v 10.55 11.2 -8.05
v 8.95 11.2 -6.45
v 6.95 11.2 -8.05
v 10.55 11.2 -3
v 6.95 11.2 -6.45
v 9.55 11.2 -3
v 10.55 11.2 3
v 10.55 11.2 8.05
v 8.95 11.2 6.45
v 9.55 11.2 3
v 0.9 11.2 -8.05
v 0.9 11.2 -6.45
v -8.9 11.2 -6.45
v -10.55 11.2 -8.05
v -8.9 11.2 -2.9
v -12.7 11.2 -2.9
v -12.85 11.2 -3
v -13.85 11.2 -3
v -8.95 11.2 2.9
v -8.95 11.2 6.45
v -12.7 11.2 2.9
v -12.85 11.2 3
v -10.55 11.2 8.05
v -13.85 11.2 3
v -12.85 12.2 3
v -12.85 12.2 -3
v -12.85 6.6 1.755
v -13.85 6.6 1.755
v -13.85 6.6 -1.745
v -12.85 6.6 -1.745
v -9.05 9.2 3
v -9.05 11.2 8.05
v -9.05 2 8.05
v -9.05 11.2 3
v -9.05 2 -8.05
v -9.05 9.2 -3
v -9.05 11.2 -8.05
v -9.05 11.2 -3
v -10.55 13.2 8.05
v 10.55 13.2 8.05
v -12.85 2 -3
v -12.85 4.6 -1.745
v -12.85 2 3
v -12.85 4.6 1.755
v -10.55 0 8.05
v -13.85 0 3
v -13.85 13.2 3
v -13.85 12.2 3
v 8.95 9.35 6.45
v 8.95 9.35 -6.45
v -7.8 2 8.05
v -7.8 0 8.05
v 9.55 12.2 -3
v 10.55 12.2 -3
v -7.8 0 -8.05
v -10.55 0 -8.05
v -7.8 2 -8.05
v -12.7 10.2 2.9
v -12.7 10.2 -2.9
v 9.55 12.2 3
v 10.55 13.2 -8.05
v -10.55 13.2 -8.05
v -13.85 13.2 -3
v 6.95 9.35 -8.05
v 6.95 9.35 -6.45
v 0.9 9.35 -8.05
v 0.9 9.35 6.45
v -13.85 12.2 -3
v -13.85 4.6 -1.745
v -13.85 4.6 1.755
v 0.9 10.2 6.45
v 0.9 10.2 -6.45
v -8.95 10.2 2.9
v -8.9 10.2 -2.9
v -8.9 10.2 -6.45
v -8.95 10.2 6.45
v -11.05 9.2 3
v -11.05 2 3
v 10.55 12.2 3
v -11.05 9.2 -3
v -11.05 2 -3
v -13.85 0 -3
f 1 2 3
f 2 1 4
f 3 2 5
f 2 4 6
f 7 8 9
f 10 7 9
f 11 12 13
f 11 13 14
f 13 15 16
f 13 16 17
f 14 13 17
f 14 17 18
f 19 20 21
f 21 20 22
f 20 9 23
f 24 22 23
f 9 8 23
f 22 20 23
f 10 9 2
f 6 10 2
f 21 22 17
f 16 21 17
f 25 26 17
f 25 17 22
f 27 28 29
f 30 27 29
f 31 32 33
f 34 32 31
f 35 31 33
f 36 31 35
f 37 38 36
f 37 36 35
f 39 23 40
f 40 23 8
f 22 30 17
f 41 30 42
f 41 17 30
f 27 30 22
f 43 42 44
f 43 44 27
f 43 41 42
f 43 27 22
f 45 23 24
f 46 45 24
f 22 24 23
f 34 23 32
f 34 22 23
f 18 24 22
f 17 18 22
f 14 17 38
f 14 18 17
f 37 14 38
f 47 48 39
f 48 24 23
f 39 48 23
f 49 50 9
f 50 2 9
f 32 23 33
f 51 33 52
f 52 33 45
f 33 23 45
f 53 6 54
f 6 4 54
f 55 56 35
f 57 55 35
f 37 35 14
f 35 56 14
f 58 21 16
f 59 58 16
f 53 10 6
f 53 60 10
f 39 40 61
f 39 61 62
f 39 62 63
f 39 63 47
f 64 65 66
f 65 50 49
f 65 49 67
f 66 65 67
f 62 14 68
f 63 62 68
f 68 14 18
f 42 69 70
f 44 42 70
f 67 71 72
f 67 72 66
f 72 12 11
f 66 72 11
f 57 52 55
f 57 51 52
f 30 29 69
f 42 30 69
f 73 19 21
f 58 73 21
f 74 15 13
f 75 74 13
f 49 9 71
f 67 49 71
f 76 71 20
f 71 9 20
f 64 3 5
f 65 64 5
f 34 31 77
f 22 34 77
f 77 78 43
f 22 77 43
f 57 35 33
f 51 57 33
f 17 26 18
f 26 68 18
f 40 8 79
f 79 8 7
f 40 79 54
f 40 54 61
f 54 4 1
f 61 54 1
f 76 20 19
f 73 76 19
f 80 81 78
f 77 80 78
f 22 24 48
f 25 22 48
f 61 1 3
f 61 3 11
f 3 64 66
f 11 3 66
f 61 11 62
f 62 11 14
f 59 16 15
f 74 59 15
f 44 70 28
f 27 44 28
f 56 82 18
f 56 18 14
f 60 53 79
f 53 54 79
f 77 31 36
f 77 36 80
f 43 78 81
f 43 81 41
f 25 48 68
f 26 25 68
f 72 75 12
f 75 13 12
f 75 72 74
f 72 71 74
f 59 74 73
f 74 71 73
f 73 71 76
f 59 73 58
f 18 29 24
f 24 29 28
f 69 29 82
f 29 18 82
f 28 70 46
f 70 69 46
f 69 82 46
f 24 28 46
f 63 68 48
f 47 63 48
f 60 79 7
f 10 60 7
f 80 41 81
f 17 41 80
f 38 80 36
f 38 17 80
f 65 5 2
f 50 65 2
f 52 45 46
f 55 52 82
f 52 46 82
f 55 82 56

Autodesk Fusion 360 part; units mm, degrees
sketch "Sketch1" plane through (0, 0, 0) normal (0, 1, 0) x (1, 0, 0)
  line L0 (10.55, -8.05) -> (-10.55, -8.05)
  line L1 (-10.55, -8.05) -> (-10.55, 8.05)
  line L2 (-10.55, 8.05) -> (10.55, 8.05)
  line L3 (10.55, 8.05) -> (10.55, -8.05)
  line L4 (10.55, -8.05) -> (-10.55, 8.05) construction
  line L5 (-10.55, -8.05) -> (10.55, 8.05) construction
  dimension "d1" = 21.1
  dimension "d2" = 16.1
extrude "Extrude1" add sketch "Sketch1" along normal blind 3.5 makes body 1
sketch "Sketch2" plane through (0, 3.5, 0) normal (0, 1, 0) x (-1, 0, 0)
  line L0 (-10.55, -8.05) -> (10.55, -8.05)
  line L1 (10.55, -8.05) -> (10.55, 8.05)
  line L2 (10.55, 8.05) -> (-10.55, 8.05)
  line L3 (-10.55, 8.05) -> (-10.55, -8.05)
  line L4 (-9.05, 6.55) -> (9.05, 6.55)
  line L5 (9.05, 6.55) -> (9.05, -6.55)
  line L6 (9.05, -6.55) -> (-9.05, -6.55)
  line L7 (-9.05, -6.55) -> (-9.05, 6.55)
  line L8 (-9.05, 6.55) -> (9.05, -6.55) construction
  line L9 (9.05, 6.55) -> (-9.05, -6.55) construction
  dimension "d5" = 18.1
  dimension "d6" = 13.1
extrude "Extrude2" cut sketch "Sketch2" against normal blind 1.5 contours L4 L5 L6 L7 bodies 1
extrude "Extrude3" add 1 faces at (-3.0167, 3.5, -7.55) along direction (0, 1, 0) blind 5.7 on bodies 1 bodies 1
sketch "Sketch3" plane through (0, 9.2, 0) normal (0, 1, 0) x (-1, 0, 0)
  line L0 (9.05, 6.55) -> (9.05, -6.55)
  line L1 (9.05, -6.55) -> (-9.05, -6.55)
  line L2 (-9.05, -6.55) -> (-9.05, 6.55)
  line L3 (-9.05, 6.55) -> (9.05, 6.55)
  line L4 (-10.55, -8.05) -> (10.55, -8.05)
  line L5 (10.55, -8.05) -> (10.55, 8.05)
  line L6 (10.55, 8.05) -> (-10.55, 8.05)
  line L7 (-10.55, 8.05) -> (-10.55, -8.05)
  line L8 (-9.05, -6.55) -> (-7.1, -6.55)
  line L9 (-7.1, -6.55) -> (-7.1, -8.05)
  line L10 (-7.1, -8.05) -> (-9.05, -8.05)
  line L11 (-9.05, -8.05) -> (-9.05, -6.55)
  line L12 (-7.1, -6.55) -> (-0.8, -6.55)
  line L13 (-0.8, -6.55) -> (-0.8, -8.05)
  line L14 (-0.8, -8.05) -> (-7.1, -8.05)
  line L15 (-7.1, -8.05) -> (-7.1, -6.55)
  dimension "d11" = 1.95
  dimension "d12" = 6.3
extrude "Extrude4" cut sketch "Sketch3" against normal blind 5.7 contours L1 L4 L9 L12 L13 L14 L15 bodies 1
sketch "Sketch4" plane through (0, 2, 0) normal (0, 1, 0) x (-1, 0, 0)
  line L0 (-9.05, -6.55) -> (9.05, -6.55)
  line L1 (9.05, -6.55) -> (9.05, 6.55)
  line L2 (9.05, 6.55) -> (-9.05, 6.55)
  line L3 (-9.05, 6.55) -> (-9.05, -6.55)
  line L4 (-0.8, -6.55) -> (-7.1, -6.55)
  line L5 (-7.1, -6.55) -> (-7.1, -8.05)
  line L6 (-7.1, -8.05) -> (-0.8, -8.05)
  line L7 (-0.8, -8.05) -> (-0.8, -6.55)
  line L8 (9.05, -6.55) -> (5.55, -6.55)
  line L9 (5.55, -6.55) -> (5.55, 6.55)
  line L10 (5.55, 6.55) -> (9.05, 6.55)
  line L11 (9.05, 6.55) -> (9.05, -6.55)
  dimension "d15" = 3.5
extrude "Extrude5" cut sketch "Sketch4" against normal blind 1 contours L0 L1 L2 L8 L9 L10 L11 bodies 1
sketch "Sketch5" plane through (0, 9.2, 0) normal (0, 1, 0) x (-1, 0, 0)
  line L0 (-7.1, -8.05) -> (-7.1, -6.55)
  line L1 (-7.1, -6.55) -> (-9.05, -6.55)
  line L2 (-9.05, -6.55) -> (-9.05, 6.55)
  line L3 (-9.05, 6.55) -> (9.05, 6.55)
  line L4 (9.05, 6.55) -> (9.05, -6.55)
  line L5 (9.05, -6.55) -> (-0.8, -6.55)
  line L6 (-0.8, -6.55) -> (-0.8, -8.05)
  line L7 (-0.8, -8.05) -> (10.55, -8.05)
  line L8 (10.55, -8.05) -> (10.55, 8.05)
  line L9 (10.55, 8.05) -> (-10.55, 8.05)
  line L10 (-10.55, 8.05) -> (-10.55, -8.05)
  line L11 (-10.55, -8.05) -> (-7.1, -8.05)
  line L12 (12.85, -3) -> (8.25, -3)
  line L13 (8.25, -3) -> (8.25, 3)
  line L14 (8.25, 3) -> (12.85, 3)
  line L15 (12.85, 3) -> (12.85, -3)
  line L16 (12.85, -3) -> (8.25, 3) construction
  line L17 (8.25, -3) -> (12.85, 3) construction
  line L18 (12.85, -3) -> (13.85, -3)
  line L19 (13.85, -3) -> (13.85, 3)
  line L20 (13.85, 3) -> (12.85, 3)
  line L21 (12.85, 3) -> (12.85, -3)
  line L22 (10.55, -8.05) -> (10.55, 8.05)
  line L23 (10.55, 8.05) -> (13.85, 3)
  line L24 (13.85, -3) -> (10.55, -8.05)
  point P0 (10.55, 0)
  dimension "d18" = 4.6
  dimension "d19" = 6
  dimension "d20" = 1
extrude "Extrude6" add sketch "Sketch5" against normal blind 9.2 contours L8 L14 L20 L22 L23 | L8 L12 L14 L15 L21 L22 | L15 L18 L19 L20 L21 | L8 L12 L18 L22 L24 bodies 1
sketch "Sketch6" plane through (0, 9.2, 0) normal (0, 1, 0) x (-1, 0, 0)
  line L0 (-7.1, -8.05) -> (-7.1, -6.55)
  line L1 (-7.1, -6.55) -> (-9.05, -6.55)
  line L2 (-9.05, -6.55) -> (-9.05, 6.55)
  line L3 (-9.05, 6.55) -> (9.05, 6.55)
  line L4 (9.05, 6.55) -> (9.05, -6.55)
  line L5 (9.05, -6.55) -> (-0.8, -6.55)
  line L6 (-0.8, -6.55) -> (-0.8, -8.05)
  line L7 (-0.8, -8.05) -> (10.55, -8.05)
  line L8 (10.55, -8.05) -> (13.85, -3)
  line L9 (13.85, -3) -> (13.85, 3)
  line L10 (13.85, 3) -> (10.55, 8.05)
  line L11 (10.55, 8.05) -> (-10.55, 8.05)
  line L12 (-10.55, 8.05) -> (-10.55, -8.05)
  line L13 (-10.55, -8.05) -> (-7.1, -8.05)
  line L14 (13.85, -3) -> (12.85, -3)
  line L15 (12.85, -3) -> (12.85, 3)
  line L16 (12.85, 3) -> (13.85, 3)
  line L17 (13.85, 3) -> (13.85, -3)
  line L18 (12.85, -3) -> (11.05, -3)
  line L19 (11.05, -3) -> (11.05, 3)
  line L20 (11.05, 3) -> (12.85, 3)
  line L21 (12.85, 3) -> (12.85, -3)
  dimension "d23" = 1
  dimension "d24" = 1.8
extrude "Extrude7" cut sketch "Sketch6" against normal blind 7.2 contours L15 L18 L19 L20 L21 bodies 1
extrude "Extrude8" add 1 faces at (-9.7167, 9.2, -1) along direction (0, 1, 0) blind 2 on bodies 1 bodies 1
sketch "Sketch7" plane through (0, 11.2, 0) normal (0, 1, 0) x (-1, 0, 0)
  line L0 (11.05, -3) -> (11.05, 3)
  line L1 (11.05, 3) -> (12.85, 3)
  line L2 (12.85, 3) -> (12.85, -3)
  line L3 (12.85, -3) -> (11.05, -3)
  line L4 (-7.1, -8.05) -> (-7.1, -6.55)
  line L5 (-7.1, -6.55) -> (-9.05, -6.55)
  line L6 (-9.05, -6.55) -> (-9.05, 6.55)
  line L7 (-9.05, 6.55) -> (9.05, 6.55)
  line L8 (9.05, 6.55) -> (9.05, -6.55)
  line L9 (9.05, -6.55) -> (-0.8, -6.55)
  line L10 (-0.8, -6.55) -> (-0.8, -8.05)
  line L11 (-0.8, -8.05) -> (10.55, -8.05)
  line L12 (10.55, -8.05) -> (13.85, -3)
  line L13 (13.85, -3) -> (13.85, 3)
  line L14 (13.85, 3) -> (10.55, 8.05)
  line L15 (10.55, 8.05) -> (-10.55, 8.05)
  line L16 (-10.55, 8.05) -> (-10.55, -8.05)
  line L17 (-10.55, -8.05) -> (-7.1, -8.05)
  line L18 (11.05, -3) -> (9.05, -3)
  line L19 (9.05, -3) -> (9.05, 3)
  line L20 (9.05, 3) -> (11.05, 3)
  line L21 (11.05, 3) -> (11.05, -3)
extrude "Extrude9" cut sketch "Sketch7" against normal blind 2 contours L0 L8 L18 L19 L20 L21 bodies 1
copy_body "Body->Comp1" bodies 1 removing the originals makes body 2 in component "WSSM-03: Lower Half "
sketch "Sketch1 (2)" plane through (0, 11.2, 0) normal (0, 1, 0) x (-1, 0, 0) in component "WSSM-04: Upper Half"
  line L0 (9.05, 3) -> (12.85, 3)
  line L1 (12.85, 3) -> (12.85, -3)
  line L2 (12.85, -3) -> (9.05, -3)
  line L3 (9.05, -3) -> (9.05, -6.55)
  line L4 (9.05, -6.55) -> (-0.8, -6.55)
  line L5 (-0.8, -6.55) -> (-0.8, -8.05)
  line L6 (-0.8, -8.05) -> (10.55, -8.05)
  line L7 (10.55, -8.05) -> (13.85, -3)
  line L8 (13.85, -3) -> (13.85, 3)
  line L9 (13.85, 3) -> (10.55, 8.05)
  line L10 (10.55, 8.05) -> (-10.55, 8.05)
  line L11 (-10.55, 8.05) -> (-10.55, -8.05)
  line L12 (-10.55, -8.05) -> (-7.1, -8.05)
  line L13 (-7.1, -8.05) -> (-7.1, -6.55)
  line L14 (-7.1, -6.55) -> (-9.05, -6.55)
  line L15 (-9.05, -6.55) -> (-9.05, 6.55)
  line L16 (-9.05, 6.55) -> (9.05, 6.55)
  line L17 (9.05, 6.55) -> (9.05, 3)
  line L18 (-9.05, 6.55) -> (-0.8, 6.55)
  line L19 (-0.8, 6.55) -> (-0.8, -6.55)
  line L20 (-0.8, -6.55) -> (-9.05, -6.55)
  line L21 (-9.05, -6.55) -> (-9.05, 6.55)
  line L22 (-0.8, -8.05) -> (-7.1, -8.05)
  line L23 (-7.1, -8.05) -> (-7.1, -6.55)
  line L24 (-7.1, -6.55) -> (-0.8, -6.55)
  line L25 (-0.8, -6.55) -> (-0.8, -8.05)
extrude "Extrude1'" add sketch "Sketch1 (2)" against normal blind 1.85 separate body contours L14 L15 L16 L18 L19 L20 L21 L24 | L5 L13 L20 L22 L23 L24 L25 makes body 3 in component "WSSM-04: Upper Half"
move_face "OffsetFaces1" offset -0.1 1 faces at (9.05, 10.5833, -2.1833) on bodies 3 in component "WSSM-04: Upper Half"
move_face "OffsetFaces2" offset -0.1 1 faces at (3.5167, 9.9667, 6.55) on bodies 3 in component "WSSM-04: Upper Half"
move_face "OffsetFaces3" offset -0.1 1 faces at (7.7167, 10.5833, -6.55) on bodies 3 in component "WSSM-04: Upper Half"
move_face "OffsetFaces4" offset -0.15 1 faces at (7.1, 10.5833, -7.5167) on bodies 3 in component "WSSM-04: Upper Half"
sketch "Sketch2 (2)" plane through (0, 11.2, 0) normal (0, 1, 0) x (-1, 0, 0) in component "WSSM-04: Upper Half"
  line L0 (9.05, 3) -> (12.85, 3)
  line L1 (12.85, 3) -> (12.85, -3)
  line L2 (12.85, -3) -> (9.05, -3)
  line L3 (9.05, -3) -> (9.05, -6.55)
  line L4 (9.05, -6.55) -> (-0.8, -6.55)
  line L5 (-0.8, -6.55) -> (-0.8, -8.05)
  line L6 (-0.8, -8.05) -> (10.55, -8.05)
  line L7 (10.55, -8.05) -> (13.85, -3)
  line L8 (13.85, -3) -> (13.85, 3)
  line L9 (13.85, 3) -> (10.55, 8.05)
  line L10 (10.55, 8.05) -> (-10.55, 8.05)
  line L11 (-10.55, 8.05) -> (-10.55, -8.05)
  line L12 (-10.55, -8.05) -> (-7.1, -8.05)
  line L13 (-7.1, -8.05) -> (-7.1, -6.55)
  line L14 (-7.1, -6.55) -> (-9.05, -6.55)
  line L15 (-9.05, -6.55) -> (-9.05, 6.55)
  line L16 (-9.05, 6.55) -> (9.05, 6.55)
  line L17 (9.05, 6.55) -> (9.05, 3)
  line L18 (9.05, -6.55) -> (-0.8, -6.55)
  line L19 (-0.8, -6.55) -> (-0.8, 6.45)
  line L20 (-0.8, 6.45) -> (9.05, 6.45)
  line L21 (9.05, 6.45) -> (9.05, -6.55)
  line L22 (9.05, -3) -> (12.85, -3)
  line L23 (12.85, -3) -> (12.85, 3)
  line L24 (12.85, 3) -> (9.05, 3)
  line L25 (9.05, 3) -> (9.05, -3)
  point P0 (-0.8, 6.45)
extrude "Extrude2'" add sketch "Sketch2 (2)" against normal blind 1 contours L3 L4 L17 L18 L19 L20 L21 L25 | L0 L1 L2 L21 L22 L23 L24 L25 bodies 3 in component "WSSM-04: Upper Half"
move_face "OffsetFaces5" offset -0.1 1 faces at (-9.05, 10.8667, 5.3) on bodies 3 in component "WSSM-04: Upper Half"
move_face "OffsetFaces6" offset -0.1 1 faces at (-10.25, 10.8667, 3) on bodies 3 in component "WSSM-04: Upper Half"
move_face "OffsetFaces7" offset -0.15 1 faces at (-12.85, 10.8667, 0.9333) on bodies 3 in component "WSSM-04: Upper Half"
move_face "OffsetFaces8" offset -0.1 1 faces at (-11.4833, 10.8667, -3) on bodies 3 in component "WSSM-04: Upper Half"
move_face "OffsetFaces9" offset -0.15 1 faces at (-9.05, 10.8667, -4.1167) on bodies 3 in component "WSSM-04: Upper Half"
move_face "OffsetFaces10" offset -0.1 1 faces at (-5.6667, 10.5333, -6.55) on bodies 3 in component "WSSM-04: Upper Half"
move_face "OffsetFaces11" offset -0.1 1 faces at (0.8, 10.25, -7.5167) on bodies 3 in component "WSSM-04: Upper Half"
sketch "Sketch3 (2)" plane through (0, 11.2, 0) normal (0, 1, 0) x (-1, 0, 0) in component "WSSM-04: Upper Half"
  line L0 (9.05, 3) -> (12.85, 3)
  line L1 (12.85, 3) -> (12.85, -3)
  line L2 (12.85, -3) -> (9.05, -3)
  line L3 (9.05, -3) -> (9.05, -6.55)
  line L4 (9.05, -6.55) -> (-0.8, -6.55)
  line L5 (-0.8, -6.55) -> (-0.8, -8.05)
  line L6 (-0.8, -8.05) -> (10.55, -8.05)
  line L7 (10.55, -8.05) -> (13.85, -3)
  line L8 (13.85, -3) -> (13.85, 3)
  line L9 (13.85, 3) -> (10.55, 8.05)
  line L10 (10.55, 8.05) -> (-10.55, 8.05)
  line L11 (-10.55, 8.05) -> (-10.55, -8.05)
  line L12 (-10.55, -8.05) -> (-7.1, -8.05)
  line L13 (-7.1, -8.05) -> (-7.1, -6.55)
  line L14 (-7.1, -6.55) -> (-9.05, -6.55)
  line L15 (-9.05, -6.55) -> (-9.05, 6.55)
  line L16 (-9.05, 6.55) -> (9.05, 6.55)
  line L17 (9.05, 6.55) -> (9.05, 3)
  line L18 (-10.55, -8.05) -> (10.55, -8.05)
  line L19 (13.85, -3) -> (13.85, 3)
  line L20 (10.55, 8.05) -> (-10.55, 8.05)
extrude "Extrude3'" add sketch "Sketch3 (2)" along normal blind 2 bodies 3 in component "WSSM-04: Upper Half"
sketch "Sketch4 (2)" plane through (-13.85, 0, 0) normal (-1, 0, 0) x (0, 0, 1) in component "WSSM-04: Upper Half"
  line L0 (-3, 11.2) -> (3, 11.2)
  line L1 (3, 11.2) -> (3, 13.2)
  line L2 (3, 13.2) -> (-3, 13.2)
  line L3 (-3, 13.2) -> (-3, 11.2)
  line L4 (-3, 11.2) -> (3, 11.2)
  line L5 (3, 11.2) -> (3, 12.2)
  line L6 (3, 12.2) -> (-3, 12.2)
  line L7 (-3, 12.2) -> (-3, 11.2)
extrude "Extrude4'" cut sketch "Sketch4 (2)" against normal blind 1 contours L0 L1 L3 L4 L5 L6 L7 bodies 3 in component "WSSM-04: Upper Half"
sketch "Sketch5 (2)" plane through (10.55, 0, 0) normal (1, 0, 0) x (0, 0, -1) in component "WSSM-04: Upper Half"
  line L0 (-8.05, 11.2) -> (8.05, 11.2)
  line L1 (8.05, 11.2) -> (8.05, 13.2)
  line L2 (8.05, 13.2) -> (-8.05, 13.2)
  line L3 (-8.05, 13.2) -> (-8.05, 11.2)
  line L4 (3, 12.2) -> (-3, 12.2)
  line L5 (-3, 12.2) -> (-3, 10.2)
  line L6 (-3, 10.2) -> (3, 10.2)
  line L7 (3, 10.2) -> (3, 12.2)
  line L8 (3, 12.2) -> (-3, 10.2) construction
  line L9 (-3, 12.2) -> (3, 10.2) construction
  line L10 (-3, 12.2) -> (3, 12.2)
  line L11 (3, 12.2) -> (3, 11.2)
  line L12 (3, 11.2) -> (-3, 11.2)
  line L13 (-3, 11.2) -> (-3, 12.2)
  point P0 (0, 11.2)
  dimension "d50" = 6
  dimension "d51" = 2
  dimension "d52" = 6
  dimension "d53" = 1
extrude "Extrude5'" cut sketch "Sketch5 (2)" against normal blind 1 contours L0 L4 L5 L7 L10 L11 L12 L13 bodies 3 in component "WSSM-04: Upper Half"
sketch "Sketch8" plane through (-9.05, 0, 0) normal (1, 0, 0) x (0, 0, -1)
  line L0 (-3, 9.2) -> (-3, 11.2)
  line L1 (-3, 11.2) -> (-6.55, 11.2)
  line L2 (-6.55, 11.2) -> (-6.55, 1)
  line L3 (-6.55, 1) -> (6.55, 1)
  line L4 (6.55, 1) -> (6.55, 11.2)
  line L5 (6.55, 11.2) -> (3, 11.2)
  line L6 (3, 11.2) -> (3, 9.2)
  line L7 (3, 9.2) -> (-3, 9.2)
  line L8 (-9, 13) -> (9.4138, 13)
  line L9 (9.4138, 13) -> (9.4138, -1)
  line L10 (9.4138, -1) -> (-9, -1)
  line L11 (-9, -1) -> (-9, 13)
extrude "Extrude1''" cut sketch "Sketch8" along normal through all contours L0 L1 L2 L3 L4 L5 L6 L7 | L8 L9 L10 L11 bodies 2 in component "WSSM-03: Lower Half "
sketch "Sketch9" plane through (-13.85, 0, 0) normal (-1, 0, 0) x (0, 0, 1)
  line L0 (-3, 11.2) -> (-3, 0)
  line L1 (-3, 0) -> (3, 0)
  line L2 (3, 0) -> (3, 11.2)
  line L3 (3, 11.2) -> (-3, 11.2)
  line L4 (1.7549, 6.6) -> (-1.7451, 6.6)
  line L5 (-1.7451, 6.6) -> (-1.7451, 4.6)
  line L6 (-1.7451, 4.6) -> (1.7549, 4.6)
  line L7 (1.7549, 4.6) -> (1.7549, 6.6)
  line L8 (1.7549, 6.6) -> (-1.7451, 4.6) construction
  line L9 (-1.7451, 6.6) -> (1.7549, 4.6) construction
  point P0 (0.0049, 5.6)
  dimension "d57" = 3.5
  dimension "d58" = 2
extrude "Extrude2''" cut sketch "Sketch9" against normal blind 1 contours L4 L5 L6 L7 bodies 2 in component "WSSM-03: Lower Half "
sketch "Sketch10" plane through (-9.05, 0, 0) normal (1, 0, 0) x (0, 0, -1)
  line L0 (-3, 9.2) -> (-3, 11.2)
  line L1 (-3, 11.2) -> (-8.05, 11.2)
  line L2 (-8.05, 11.2) -> (-8.05, 0)
  line L3 (-8.05, 0) -> (8.05, 0)
  line L4 (8.05, 0) -> (8.05, 11.2)
  line L5 (8.05, 11.2) -> (3, 11.2)
  line L6 (3, 11.2) -> (3, 9.2)
  line L7 (3, 9.2) -> (-3, 9.2)
  line L8 (8.05, 11.2) -> (8.05, 2)
  line L9 (8.05, 2) -> (-8.05, 2)
  line L10 (-8.05, 2) -> (-8.05, 0)
  line L11 (-8.05, 0) -> (8.05, 0)
  line L12 (8.05, 0) -> (8.05, 2)
  dimension "d61" = 9.2
extrude "Extrude3''" add sketch "Sketch10" along normal blind 1.25 contours L2 L3 L4 L9 L10 L11 L12 bodies 2 in component "WSSM-03: Lower Half "
component "WSSM-03: Lower Half " placed x (1, 0, 0) y (0, 1, 0) z (0, 0, 1) at (0, 0, 0)
component "WSSM-04: Upper Half" placed x (1, 0, 0) y (0, 1, 0) z (0, 0, 1) at (0, 0, 0)
